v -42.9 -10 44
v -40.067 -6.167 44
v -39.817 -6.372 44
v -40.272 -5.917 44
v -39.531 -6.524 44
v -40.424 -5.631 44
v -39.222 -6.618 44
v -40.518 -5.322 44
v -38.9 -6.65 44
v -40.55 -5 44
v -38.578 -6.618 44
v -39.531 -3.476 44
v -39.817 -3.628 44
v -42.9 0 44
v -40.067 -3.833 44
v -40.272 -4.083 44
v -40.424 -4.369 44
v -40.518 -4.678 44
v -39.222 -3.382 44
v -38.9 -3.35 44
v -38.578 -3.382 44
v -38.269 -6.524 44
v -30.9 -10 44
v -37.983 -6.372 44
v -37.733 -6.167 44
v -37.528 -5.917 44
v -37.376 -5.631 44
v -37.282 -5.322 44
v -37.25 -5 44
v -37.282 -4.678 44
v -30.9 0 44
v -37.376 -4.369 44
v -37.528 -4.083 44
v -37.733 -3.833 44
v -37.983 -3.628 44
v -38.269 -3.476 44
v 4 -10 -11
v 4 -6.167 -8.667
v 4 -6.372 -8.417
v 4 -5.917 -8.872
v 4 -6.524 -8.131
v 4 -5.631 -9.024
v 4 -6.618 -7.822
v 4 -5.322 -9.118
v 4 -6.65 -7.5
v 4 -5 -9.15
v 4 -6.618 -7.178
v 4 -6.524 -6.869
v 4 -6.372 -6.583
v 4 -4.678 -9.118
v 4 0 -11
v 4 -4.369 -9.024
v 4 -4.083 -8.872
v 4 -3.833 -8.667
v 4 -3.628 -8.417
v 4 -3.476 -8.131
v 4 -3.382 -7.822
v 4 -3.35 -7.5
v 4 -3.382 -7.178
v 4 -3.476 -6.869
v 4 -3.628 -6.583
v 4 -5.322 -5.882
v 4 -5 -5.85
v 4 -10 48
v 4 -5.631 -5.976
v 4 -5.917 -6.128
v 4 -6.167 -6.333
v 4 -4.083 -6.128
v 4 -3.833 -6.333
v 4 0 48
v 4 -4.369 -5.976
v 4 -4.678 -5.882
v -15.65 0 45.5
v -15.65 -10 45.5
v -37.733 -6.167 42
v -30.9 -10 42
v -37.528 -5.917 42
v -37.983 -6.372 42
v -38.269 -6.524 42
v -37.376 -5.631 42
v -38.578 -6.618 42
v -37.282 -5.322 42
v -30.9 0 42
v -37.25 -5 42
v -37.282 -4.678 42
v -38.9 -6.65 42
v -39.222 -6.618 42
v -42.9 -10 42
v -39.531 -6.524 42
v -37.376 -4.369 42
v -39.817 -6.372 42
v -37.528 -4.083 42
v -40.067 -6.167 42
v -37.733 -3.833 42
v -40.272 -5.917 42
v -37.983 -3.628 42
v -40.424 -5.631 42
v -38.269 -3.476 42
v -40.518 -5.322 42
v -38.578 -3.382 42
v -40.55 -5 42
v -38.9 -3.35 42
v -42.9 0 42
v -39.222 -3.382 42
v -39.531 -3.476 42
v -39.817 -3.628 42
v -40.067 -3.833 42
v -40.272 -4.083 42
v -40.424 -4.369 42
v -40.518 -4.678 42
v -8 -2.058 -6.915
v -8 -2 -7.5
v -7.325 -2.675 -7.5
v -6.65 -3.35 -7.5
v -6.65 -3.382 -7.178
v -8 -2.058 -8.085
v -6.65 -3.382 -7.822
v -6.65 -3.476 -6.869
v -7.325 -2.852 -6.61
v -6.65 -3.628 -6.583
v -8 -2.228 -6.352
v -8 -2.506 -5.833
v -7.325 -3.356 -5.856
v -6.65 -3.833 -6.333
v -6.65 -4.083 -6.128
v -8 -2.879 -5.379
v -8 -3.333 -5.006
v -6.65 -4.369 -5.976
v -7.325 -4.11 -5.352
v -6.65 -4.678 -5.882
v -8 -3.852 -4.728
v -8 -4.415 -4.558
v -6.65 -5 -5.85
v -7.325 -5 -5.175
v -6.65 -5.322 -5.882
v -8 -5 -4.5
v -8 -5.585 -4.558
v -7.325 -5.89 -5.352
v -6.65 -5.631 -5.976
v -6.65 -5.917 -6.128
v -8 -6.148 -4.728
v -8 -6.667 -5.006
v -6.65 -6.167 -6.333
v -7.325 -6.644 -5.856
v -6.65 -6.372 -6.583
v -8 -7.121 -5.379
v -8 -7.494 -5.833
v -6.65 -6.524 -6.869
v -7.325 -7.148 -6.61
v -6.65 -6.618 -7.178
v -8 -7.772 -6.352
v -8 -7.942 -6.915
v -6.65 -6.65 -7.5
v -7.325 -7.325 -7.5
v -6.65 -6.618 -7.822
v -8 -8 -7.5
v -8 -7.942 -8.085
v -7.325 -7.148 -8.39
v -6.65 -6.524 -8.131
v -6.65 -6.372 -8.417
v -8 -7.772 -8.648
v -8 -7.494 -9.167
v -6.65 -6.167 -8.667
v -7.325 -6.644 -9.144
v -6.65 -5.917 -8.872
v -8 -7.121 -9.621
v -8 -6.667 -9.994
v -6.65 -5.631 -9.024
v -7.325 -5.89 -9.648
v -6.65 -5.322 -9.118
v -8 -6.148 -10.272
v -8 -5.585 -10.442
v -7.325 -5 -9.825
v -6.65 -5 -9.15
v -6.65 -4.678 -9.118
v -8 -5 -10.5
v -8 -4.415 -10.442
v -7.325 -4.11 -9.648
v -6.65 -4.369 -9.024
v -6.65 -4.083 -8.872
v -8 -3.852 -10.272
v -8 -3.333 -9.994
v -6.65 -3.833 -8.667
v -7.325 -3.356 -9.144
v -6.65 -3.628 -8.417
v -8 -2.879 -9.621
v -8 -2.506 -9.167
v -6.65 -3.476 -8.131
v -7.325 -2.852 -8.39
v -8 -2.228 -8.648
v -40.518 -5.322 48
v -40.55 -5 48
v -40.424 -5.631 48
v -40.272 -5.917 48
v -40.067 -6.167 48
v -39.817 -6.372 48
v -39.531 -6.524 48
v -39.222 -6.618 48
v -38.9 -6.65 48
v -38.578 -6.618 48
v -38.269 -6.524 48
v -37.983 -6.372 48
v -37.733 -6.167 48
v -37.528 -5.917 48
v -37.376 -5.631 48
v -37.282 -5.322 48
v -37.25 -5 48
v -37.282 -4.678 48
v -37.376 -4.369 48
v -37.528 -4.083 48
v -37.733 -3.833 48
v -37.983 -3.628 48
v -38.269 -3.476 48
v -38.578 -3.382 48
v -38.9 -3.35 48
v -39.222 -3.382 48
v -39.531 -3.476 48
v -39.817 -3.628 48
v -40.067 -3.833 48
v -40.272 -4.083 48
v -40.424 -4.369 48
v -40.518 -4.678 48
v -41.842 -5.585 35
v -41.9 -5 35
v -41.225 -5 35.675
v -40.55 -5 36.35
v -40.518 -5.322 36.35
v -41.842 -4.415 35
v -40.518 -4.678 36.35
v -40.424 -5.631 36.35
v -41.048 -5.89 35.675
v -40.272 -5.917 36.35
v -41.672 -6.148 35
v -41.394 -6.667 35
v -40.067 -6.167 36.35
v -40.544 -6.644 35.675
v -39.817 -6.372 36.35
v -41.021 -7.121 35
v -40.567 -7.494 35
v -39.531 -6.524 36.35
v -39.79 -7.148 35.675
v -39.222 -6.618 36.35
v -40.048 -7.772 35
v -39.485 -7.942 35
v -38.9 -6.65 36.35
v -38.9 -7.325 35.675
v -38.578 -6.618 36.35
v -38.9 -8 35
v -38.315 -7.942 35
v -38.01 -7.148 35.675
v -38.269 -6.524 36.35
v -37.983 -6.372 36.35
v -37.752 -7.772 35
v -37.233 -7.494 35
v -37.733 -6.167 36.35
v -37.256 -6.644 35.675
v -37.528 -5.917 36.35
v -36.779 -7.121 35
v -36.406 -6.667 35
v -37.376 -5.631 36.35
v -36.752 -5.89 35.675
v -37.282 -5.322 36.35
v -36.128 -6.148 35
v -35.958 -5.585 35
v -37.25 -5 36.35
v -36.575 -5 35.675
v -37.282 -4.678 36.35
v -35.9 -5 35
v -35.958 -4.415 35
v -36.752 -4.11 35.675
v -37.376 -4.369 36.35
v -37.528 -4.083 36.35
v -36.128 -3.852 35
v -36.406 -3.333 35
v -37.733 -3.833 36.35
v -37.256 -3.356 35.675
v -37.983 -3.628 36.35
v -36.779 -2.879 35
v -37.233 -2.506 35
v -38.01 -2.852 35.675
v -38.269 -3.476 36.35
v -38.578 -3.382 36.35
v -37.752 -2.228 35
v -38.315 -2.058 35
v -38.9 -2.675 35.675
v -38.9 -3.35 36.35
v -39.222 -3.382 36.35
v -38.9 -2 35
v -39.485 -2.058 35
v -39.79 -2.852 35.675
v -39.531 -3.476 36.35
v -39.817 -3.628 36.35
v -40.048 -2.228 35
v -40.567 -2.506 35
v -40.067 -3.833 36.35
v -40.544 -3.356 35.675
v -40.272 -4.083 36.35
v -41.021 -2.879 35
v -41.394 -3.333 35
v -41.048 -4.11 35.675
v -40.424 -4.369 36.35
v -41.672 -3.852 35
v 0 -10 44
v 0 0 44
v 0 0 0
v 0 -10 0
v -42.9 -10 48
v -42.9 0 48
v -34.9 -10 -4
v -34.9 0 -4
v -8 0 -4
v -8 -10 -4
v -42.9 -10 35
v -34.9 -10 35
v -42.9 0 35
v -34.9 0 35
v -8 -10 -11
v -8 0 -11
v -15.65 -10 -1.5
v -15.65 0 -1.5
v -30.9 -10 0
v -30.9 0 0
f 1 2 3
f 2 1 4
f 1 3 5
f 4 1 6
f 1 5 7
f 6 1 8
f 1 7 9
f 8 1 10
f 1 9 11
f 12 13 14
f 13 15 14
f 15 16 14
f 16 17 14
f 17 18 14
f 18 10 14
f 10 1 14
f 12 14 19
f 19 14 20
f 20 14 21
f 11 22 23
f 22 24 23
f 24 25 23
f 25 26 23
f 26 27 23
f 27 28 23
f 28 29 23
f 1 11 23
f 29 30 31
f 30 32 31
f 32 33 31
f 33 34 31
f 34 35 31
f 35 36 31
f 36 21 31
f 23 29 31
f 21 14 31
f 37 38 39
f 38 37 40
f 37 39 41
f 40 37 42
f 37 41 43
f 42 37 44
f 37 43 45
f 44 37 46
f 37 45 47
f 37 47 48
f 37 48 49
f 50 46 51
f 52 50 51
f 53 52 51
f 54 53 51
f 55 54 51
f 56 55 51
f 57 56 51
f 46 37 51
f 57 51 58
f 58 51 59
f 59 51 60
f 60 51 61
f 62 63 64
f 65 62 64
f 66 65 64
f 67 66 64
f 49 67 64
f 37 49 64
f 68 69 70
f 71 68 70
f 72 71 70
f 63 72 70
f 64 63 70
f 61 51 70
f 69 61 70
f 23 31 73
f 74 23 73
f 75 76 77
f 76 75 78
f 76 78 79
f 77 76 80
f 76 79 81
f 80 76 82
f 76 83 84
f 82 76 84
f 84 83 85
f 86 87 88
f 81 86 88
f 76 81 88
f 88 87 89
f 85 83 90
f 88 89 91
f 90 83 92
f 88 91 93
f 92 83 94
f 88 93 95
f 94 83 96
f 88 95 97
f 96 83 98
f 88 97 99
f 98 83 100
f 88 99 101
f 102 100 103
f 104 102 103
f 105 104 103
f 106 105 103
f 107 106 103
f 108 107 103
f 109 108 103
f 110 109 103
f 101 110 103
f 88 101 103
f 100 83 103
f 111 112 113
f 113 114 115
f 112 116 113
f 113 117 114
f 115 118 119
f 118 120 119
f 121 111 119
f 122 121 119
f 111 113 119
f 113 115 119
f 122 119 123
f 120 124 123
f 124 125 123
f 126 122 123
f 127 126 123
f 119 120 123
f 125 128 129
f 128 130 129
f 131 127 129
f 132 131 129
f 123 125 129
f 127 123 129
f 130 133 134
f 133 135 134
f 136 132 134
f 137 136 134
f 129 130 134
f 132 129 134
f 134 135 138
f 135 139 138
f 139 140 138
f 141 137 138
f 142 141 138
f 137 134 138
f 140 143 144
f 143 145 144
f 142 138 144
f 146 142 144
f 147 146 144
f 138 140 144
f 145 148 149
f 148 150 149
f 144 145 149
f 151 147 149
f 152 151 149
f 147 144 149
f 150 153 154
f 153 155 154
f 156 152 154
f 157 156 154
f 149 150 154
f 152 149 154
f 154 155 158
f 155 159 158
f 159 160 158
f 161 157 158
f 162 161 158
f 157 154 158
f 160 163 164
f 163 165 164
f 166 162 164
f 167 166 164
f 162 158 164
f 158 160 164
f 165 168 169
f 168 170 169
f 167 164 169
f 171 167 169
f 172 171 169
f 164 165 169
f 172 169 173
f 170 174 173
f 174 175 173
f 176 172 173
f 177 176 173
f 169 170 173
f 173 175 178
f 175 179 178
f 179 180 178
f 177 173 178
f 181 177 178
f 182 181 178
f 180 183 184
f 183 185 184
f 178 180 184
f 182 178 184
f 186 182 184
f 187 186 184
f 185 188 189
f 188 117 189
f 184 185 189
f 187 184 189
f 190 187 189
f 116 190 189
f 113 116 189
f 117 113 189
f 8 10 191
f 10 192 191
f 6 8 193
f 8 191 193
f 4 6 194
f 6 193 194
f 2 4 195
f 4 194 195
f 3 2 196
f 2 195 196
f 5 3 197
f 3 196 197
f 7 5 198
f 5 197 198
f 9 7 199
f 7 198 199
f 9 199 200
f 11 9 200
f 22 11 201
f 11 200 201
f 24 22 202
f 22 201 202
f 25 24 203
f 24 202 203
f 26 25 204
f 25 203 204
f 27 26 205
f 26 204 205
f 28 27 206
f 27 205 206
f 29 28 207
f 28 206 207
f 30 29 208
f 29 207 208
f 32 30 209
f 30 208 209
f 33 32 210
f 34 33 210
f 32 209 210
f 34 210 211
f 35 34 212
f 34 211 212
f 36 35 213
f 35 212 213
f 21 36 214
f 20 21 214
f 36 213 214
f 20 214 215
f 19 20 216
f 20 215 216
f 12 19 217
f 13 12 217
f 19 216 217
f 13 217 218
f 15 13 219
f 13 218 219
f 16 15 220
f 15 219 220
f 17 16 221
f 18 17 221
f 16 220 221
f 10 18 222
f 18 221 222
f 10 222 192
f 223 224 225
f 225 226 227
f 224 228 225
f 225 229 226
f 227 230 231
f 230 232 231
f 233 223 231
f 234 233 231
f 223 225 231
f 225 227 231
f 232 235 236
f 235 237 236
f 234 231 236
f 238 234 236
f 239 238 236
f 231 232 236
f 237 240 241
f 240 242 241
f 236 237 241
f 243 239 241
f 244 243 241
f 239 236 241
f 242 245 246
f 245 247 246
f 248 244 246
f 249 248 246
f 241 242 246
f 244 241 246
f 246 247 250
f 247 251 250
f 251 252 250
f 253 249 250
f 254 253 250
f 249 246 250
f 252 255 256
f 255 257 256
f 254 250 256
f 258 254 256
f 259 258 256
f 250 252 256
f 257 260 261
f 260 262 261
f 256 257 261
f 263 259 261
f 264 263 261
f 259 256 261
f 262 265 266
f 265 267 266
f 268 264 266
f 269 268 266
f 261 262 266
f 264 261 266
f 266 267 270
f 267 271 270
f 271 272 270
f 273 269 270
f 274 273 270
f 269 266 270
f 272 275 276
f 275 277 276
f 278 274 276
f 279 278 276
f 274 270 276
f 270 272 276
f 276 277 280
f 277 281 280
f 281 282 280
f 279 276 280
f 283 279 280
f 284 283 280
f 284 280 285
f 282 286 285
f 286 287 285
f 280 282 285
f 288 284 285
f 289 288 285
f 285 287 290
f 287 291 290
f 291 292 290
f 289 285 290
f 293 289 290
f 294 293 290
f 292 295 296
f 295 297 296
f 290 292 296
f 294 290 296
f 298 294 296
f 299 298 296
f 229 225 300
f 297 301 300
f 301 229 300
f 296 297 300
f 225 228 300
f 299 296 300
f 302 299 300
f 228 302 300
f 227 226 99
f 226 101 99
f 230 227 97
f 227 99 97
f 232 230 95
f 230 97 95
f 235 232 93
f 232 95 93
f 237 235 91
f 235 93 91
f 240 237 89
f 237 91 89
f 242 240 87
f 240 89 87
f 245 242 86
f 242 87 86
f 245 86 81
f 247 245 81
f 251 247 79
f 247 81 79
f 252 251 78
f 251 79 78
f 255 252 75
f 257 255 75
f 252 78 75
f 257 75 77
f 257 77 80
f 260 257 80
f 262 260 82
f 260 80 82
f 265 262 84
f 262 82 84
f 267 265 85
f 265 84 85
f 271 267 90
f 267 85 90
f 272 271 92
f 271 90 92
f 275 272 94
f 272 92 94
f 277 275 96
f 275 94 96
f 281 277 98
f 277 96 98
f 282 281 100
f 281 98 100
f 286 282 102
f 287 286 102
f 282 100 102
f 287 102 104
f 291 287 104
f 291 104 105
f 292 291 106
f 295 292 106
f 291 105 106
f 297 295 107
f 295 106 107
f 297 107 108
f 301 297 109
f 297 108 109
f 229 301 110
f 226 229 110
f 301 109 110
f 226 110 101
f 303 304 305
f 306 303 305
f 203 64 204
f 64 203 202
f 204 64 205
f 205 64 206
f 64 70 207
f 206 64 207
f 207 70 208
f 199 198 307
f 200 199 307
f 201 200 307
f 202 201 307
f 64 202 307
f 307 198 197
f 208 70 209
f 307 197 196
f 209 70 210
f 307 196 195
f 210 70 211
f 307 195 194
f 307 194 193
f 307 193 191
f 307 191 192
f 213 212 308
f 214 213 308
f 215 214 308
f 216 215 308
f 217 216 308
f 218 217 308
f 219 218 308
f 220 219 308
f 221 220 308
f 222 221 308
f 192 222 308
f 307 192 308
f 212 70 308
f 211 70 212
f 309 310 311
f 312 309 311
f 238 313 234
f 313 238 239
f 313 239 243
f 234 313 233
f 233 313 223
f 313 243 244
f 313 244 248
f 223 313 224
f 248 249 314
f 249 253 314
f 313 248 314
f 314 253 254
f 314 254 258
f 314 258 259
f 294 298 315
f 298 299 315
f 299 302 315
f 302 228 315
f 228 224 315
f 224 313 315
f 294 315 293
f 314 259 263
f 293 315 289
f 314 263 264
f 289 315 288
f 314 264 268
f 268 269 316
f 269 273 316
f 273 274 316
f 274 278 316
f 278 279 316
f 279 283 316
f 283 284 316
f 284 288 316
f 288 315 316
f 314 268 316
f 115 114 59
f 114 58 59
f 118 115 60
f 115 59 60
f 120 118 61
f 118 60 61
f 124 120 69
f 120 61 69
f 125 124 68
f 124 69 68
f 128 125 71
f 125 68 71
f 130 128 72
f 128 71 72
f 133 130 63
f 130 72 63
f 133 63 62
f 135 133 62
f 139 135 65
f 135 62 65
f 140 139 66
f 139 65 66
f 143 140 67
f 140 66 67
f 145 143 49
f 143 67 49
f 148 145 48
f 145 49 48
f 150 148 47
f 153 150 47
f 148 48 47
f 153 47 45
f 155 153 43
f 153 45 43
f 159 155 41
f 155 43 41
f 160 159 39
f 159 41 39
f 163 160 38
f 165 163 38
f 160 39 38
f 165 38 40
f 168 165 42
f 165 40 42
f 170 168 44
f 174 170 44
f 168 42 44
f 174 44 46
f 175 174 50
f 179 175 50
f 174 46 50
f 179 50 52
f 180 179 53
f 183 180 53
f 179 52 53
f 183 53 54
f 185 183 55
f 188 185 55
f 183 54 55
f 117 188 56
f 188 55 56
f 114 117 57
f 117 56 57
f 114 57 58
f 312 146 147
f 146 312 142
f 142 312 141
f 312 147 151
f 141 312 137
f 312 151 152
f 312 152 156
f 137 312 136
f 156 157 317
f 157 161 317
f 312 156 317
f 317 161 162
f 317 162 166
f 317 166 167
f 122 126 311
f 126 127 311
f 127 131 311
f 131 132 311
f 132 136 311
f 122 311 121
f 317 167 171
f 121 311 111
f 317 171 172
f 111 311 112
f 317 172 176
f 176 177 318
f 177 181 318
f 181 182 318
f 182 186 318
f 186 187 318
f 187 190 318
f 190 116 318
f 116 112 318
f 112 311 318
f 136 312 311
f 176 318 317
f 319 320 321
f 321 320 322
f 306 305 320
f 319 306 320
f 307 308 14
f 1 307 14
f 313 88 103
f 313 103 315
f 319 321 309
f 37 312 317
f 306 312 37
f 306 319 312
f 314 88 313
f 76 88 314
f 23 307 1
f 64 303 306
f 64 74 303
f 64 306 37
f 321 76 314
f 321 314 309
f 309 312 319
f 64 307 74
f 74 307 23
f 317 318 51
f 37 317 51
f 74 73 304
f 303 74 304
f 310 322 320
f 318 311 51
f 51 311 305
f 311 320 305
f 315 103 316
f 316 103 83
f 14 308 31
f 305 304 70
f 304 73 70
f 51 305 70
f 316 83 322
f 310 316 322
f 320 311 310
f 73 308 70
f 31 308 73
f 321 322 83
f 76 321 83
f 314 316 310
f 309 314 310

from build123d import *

# Parameters (mm, degrees)
F1_DEPTH       = 10
F3_D           = 3.3
F3_CSINK_D     = 6
F3_CSINK_ANGLE = 90
F5_D           = 3.3
F5_CSINK_D     = 6
F5_CSINK_ANGLE = 90


with BuildPart() as f1:
    # F0 (on Front) → F1 (new body)
    with BuildSketch(Plane.XZ):
        Polygon((0, 44), (0, 0), (-15.65, -1.5), (-30.9, 0), (-30.9, 42), (-42.9, 42), (-42.9, 35), (-34.9, 35), (-34.9, -4), (-8, -4), (-8, -11), (4, -11), (4, 48), (-42.9, 48), (-42.9, 44), (-30.9, 44), (-15.65, 45.5), align=None)
    extrude(amount=F1_DEPTH)

    # F3 (through all)
    with Locations(Plane(origin=(0, 0, 35), x_dir=(1, 0, 0), z_dir=(0, 0, -1))):
        with Locations((-38.9, 5)):
            CounterSinkHole(F3_D / 2, F3_CSINK_D / 2, counter_sink_angle=F3_CSINK_ANGLE)

    # F5 (through all)
    with Locations(Plane(origin=(-8, 0, 0), x_dir=(0, -1, 0), z_dir=(-1, 0, 0))):
        with Locations((5, -7.5)):
            CounterSinkHole(F5_D / 2, F5_CSINK_D / 2, counter_sink_angle=F5_CSINK_ANGLE)


solid = f1.part
